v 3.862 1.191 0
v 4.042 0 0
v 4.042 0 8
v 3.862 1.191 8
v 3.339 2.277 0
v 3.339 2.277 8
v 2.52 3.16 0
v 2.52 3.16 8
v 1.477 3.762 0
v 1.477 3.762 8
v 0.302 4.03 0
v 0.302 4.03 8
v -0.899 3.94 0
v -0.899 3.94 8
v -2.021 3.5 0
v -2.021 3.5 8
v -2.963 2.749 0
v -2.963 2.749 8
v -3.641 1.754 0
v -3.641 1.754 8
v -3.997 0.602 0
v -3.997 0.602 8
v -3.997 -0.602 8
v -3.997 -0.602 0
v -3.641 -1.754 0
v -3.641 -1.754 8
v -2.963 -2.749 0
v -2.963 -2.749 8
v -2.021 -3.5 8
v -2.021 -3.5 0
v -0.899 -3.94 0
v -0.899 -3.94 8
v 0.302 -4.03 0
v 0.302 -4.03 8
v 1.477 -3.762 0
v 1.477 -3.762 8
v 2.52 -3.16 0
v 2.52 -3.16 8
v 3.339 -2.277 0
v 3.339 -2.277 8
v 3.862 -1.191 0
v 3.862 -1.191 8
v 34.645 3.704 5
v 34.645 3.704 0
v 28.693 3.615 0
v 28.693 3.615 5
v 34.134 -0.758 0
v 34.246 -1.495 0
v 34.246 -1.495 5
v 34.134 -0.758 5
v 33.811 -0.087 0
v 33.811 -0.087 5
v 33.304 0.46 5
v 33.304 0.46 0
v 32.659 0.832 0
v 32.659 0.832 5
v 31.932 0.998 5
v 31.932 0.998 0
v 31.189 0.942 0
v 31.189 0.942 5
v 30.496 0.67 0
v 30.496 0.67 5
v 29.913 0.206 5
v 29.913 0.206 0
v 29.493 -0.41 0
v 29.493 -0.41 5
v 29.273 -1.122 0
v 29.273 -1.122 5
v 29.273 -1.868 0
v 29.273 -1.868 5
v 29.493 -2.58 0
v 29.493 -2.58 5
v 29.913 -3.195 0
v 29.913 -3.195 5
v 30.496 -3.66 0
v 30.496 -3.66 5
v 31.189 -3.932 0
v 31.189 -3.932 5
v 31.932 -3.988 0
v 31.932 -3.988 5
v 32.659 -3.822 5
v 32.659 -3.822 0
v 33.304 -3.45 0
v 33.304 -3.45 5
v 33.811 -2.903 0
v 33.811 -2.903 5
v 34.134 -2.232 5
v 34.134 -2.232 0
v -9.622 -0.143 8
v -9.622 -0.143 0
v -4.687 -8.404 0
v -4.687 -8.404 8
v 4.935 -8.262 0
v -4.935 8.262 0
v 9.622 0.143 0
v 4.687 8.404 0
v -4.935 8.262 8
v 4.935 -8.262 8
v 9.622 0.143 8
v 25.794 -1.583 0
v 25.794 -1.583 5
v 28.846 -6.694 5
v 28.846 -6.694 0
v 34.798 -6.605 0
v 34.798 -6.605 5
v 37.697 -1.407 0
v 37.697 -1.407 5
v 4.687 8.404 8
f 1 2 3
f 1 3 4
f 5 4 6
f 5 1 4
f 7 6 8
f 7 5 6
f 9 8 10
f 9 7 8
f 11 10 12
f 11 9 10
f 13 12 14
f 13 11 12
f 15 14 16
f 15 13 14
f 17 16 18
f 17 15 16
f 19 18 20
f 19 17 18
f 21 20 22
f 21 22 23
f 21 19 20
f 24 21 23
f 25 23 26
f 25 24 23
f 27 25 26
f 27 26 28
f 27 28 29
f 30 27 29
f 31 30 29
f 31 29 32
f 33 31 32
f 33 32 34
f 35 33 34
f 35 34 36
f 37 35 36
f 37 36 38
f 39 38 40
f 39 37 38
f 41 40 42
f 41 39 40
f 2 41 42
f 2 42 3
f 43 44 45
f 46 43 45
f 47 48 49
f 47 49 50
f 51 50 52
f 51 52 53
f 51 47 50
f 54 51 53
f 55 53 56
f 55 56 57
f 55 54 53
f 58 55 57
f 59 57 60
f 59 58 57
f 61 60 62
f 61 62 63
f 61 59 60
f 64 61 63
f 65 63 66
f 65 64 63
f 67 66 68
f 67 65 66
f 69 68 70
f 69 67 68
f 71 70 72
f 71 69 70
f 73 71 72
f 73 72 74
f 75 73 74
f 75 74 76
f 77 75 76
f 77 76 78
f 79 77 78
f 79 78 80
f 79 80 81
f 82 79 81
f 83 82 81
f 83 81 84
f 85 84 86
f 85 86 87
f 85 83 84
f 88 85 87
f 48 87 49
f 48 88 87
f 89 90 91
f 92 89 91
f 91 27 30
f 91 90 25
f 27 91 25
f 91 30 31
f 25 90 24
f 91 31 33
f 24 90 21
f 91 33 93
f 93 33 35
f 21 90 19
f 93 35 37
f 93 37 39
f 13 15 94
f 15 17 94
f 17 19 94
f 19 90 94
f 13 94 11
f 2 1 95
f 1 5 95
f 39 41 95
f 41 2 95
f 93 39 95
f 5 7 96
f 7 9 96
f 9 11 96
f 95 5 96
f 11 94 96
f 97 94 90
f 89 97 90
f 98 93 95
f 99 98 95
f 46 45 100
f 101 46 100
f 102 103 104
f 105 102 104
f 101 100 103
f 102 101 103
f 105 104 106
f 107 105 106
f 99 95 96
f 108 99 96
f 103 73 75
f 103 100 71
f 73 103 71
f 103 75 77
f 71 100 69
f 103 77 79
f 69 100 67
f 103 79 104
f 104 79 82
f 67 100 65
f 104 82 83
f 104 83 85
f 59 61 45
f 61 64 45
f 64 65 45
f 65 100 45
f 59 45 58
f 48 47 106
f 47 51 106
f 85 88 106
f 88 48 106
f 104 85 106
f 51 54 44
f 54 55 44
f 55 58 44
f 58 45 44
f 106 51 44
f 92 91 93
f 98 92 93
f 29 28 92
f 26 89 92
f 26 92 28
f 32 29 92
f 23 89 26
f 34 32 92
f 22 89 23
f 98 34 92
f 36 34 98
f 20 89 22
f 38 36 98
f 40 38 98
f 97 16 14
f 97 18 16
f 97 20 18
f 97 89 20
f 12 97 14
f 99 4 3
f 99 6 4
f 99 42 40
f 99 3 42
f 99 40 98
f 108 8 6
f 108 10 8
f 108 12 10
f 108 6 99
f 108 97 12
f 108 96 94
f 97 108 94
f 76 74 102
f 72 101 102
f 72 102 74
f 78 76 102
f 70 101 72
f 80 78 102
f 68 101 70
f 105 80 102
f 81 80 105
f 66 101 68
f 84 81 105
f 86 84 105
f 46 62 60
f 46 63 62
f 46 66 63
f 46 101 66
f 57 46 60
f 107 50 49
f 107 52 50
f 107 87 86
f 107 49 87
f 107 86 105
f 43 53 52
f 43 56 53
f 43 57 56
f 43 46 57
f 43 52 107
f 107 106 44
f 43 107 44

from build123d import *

# Parameters (mm, degrees)
F0_R     = 4.041675
F1_DEPTH = 8
F2_R     = 2.5
F3_DEPTH = 5


with BuildPart() as f1:
    # F0 (on Top) → F1 (new body)
    with BuildSketch(Plane.XY):
        Polygon((9.6222, 0.142791), (4.687439, 8.404465), (-4.934761, 8.261674), (-9.6222, -0.142791), (-4.687439, -8.404465), (4.934761, -8.261674), align=None)
        Circle(F0_R, mode=Mode.SUBTRACT)
    extrude(amount=F1_DEPTH)


with BuildPart() as f3:
    # F2 (on Top) → F3 (new body)
    with BuildSketch(Plane.XY):
        Polygon((37.697369, -1.406601), (34.644946, 3.703702), (28.693082, 3.615378), (25.793641, -1.58325), (28.846064, -6.693553), (34.797929, -6.605229), align=None)
        with Locations((31.745505, -1.494925)):
            Circle(F2_R, mode=Mode.SUBTRACT)
    extrude(amount=F3_DEPTH)


solid = Compound([f1.part, f3.part])
